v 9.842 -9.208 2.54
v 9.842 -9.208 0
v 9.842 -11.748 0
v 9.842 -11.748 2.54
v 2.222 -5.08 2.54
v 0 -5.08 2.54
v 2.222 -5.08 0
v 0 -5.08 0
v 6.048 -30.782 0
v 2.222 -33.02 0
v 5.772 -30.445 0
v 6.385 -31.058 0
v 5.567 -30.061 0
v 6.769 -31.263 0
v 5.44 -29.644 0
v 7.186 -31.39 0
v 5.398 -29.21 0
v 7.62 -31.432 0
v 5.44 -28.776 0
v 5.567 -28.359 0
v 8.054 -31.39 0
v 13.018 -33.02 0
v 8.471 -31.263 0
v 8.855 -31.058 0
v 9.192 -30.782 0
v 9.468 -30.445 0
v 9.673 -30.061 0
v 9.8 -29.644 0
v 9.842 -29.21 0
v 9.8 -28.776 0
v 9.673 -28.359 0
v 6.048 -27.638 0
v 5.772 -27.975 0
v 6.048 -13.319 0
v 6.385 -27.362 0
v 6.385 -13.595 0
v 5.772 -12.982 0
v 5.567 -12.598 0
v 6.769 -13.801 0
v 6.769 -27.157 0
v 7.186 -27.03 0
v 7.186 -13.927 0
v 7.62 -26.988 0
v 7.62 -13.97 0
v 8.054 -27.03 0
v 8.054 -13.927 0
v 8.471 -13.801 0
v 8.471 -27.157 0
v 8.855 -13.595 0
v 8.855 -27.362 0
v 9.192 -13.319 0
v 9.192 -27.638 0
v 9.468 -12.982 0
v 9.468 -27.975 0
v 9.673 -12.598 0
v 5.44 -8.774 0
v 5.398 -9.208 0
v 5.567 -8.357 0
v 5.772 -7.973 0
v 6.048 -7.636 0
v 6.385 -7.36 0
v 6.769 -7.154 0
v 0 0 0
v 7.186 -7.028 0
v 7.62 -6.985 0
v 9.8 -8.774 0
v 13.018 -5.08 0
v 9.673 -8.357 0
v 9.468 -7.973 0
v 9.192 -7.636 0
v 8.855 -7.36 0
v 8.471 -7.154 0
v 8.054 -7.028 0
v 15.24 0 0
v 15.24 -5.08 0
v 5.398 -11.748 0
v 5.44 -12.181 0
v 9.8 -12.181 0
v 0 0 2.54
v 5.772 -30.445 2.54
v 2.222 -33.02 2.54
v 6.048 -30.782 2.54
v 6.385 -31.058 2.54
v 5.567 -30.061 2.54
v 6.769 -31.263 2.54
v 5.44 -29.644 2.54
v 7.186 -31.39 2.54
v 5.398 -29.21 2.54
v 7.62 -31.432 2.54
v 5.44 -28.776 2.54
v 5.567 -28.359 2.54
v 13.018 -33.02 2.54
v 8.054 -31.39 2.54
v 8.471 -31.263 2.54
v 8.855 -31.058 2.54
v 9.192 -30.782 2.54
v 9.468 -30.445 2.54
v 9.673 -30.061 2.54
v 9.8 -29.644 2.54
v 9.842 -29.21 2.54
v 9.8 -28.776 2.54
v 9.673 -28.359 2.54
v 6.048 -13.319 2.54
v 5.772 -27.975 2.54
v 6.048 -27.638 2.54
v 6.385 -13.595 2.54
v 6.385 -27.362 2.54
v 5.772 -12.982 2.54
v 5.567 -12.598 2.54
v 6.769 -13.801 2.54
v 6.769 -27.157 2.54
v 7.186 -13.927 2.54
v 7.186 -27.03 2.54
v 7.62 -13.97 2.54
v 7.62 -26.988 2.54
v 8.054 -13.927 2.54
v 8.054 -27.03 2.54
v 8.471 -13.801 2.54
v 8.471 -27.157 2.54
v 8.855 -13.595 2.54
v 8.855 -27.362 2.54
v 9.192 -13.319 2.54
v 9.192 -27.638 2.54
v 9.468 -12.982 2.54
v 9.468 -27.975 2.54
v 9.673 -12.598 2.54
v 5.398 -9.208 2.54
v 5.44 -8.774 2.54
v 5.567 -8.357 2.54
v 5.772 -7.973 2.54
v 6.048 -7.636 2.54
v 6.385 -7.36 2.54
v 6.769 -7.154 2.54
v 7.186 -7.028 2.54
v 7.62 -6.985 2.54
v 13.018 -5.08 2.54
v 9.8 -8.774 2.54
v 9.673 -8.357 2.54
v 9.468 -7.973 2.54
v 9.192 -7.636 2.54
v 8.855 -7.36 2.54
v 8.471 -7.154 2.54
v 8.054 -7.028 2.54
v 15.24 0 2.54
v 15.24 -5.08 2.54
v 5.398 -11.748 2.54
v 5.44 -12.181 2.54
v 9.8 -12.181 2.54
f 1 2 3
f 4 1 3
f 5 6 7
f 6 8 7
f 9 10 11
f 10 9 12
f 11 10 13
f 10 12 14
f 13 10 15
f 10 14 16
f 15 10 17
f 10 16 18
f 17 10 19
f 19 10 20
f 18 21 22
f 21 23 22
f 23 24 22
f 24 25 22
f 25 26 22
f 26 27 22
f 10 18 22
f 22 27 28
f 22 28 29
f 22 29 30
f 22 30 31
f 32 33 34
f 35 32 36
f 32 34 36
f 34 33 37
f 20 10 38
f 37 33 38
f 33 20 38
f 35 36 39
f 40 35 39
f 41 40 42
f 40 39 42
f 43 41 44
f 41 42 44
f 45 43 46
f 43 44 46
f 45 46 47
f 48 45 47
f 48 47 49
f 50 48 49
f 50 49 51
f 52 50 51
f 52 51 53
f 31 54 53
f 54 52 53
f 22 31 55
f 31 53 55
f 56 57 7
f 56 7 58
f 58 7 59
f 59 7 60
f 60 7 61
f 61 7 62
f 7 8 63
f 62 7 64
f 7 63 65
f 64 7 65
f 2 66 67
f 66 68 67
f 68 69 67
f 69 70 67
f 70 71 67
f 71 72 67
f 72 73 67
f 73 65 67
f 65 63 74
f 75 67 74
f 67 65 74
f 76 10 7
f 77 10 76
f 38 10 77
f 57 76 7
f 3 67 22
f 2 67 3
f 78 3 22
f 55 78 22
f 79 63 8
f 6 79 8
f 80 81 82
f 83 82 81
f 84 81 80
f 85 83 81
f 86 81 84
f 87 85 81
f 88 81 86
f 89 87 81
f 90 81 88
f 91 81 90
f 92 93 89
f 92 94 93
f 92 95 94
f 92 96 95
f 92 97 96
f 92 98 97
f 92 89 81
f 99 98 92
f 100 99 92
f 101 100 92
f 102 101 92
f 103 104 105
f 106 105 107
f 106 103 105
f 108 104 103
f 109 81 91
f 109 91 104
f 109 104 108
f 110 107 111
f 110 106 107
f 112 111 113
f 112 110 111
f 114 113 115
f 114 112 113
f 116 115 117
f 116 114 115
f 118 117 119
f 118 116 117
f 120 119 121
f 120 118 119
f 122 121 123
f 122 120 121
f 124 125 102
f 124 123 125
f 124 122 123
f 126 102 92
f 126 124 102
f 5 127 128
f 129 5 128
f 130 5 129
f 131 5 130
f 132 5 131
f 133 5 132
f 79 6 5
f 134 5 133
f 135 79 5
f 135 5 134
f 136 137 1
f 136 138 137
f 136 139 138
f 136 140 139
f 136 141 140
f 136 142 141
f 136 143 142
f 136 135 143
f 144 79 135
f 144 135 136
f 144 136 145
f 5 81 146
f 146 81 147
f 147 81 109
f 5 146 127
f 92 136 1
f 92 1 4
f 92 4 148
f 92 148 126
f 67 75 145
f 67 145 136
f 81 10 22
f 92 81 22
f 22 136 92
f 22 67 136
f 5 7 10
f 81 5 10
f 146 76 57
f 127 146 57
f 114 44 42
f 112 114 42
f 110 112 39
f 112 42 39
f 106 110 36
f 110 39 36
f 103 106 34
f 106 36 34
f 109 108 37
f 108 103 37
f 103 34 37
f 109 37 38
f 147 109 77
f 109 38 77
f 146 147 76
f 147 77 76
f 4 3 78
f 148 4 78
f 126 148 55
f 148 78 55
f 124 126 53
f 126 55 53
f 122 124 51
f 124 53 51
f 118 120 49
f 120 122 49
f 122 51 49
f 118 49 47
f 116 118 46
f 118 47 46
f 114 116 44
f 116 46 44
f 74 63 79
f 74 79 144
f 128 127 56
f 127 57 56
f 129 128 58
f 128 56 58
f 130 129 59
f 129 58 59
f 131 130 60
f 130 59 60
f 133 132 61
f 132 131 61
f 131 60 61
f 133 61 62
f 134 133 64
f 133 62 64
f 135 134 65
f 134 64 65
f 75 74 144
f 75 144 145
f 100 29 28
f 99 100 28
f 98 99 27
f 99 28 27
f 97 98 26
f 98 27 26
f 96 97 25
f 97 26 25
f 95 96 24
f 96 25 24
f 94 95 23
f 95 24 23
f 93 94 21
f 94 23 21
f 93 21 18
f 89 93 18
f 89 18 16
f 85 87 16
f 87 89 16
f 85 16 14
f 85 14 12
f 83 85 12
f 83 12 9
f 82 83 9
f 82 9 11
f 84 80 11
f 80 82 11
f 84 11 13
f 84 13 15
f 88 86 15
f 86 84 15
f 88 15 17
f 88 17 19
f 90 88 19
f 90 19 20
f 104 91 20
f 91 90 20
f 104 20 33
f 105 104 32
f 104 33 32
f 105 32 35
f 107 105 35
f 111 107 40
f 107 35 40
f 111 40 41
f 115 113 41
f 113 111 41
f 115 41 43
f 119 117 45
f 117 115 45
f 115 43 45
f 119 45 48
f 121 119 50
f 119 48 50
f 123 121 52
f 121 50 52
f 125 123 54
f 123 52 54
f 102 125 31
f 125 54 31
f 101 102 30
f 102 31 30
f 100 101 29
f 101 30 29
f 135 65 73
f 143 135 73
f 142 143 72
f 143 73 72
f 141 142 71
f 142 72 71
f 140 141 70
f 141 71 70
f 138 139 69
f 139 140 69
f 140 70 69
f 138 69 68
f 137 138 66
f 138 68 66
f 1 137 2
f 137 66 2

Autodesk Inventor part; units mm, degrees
ref_plane "YZ Plane" through (0, 0, 0) normal (1, 0, 0) x (0, 1, 0)
ref_plane "XZ Plane" through (0, 0, 0) normal (0, 1, 0) x (-1, 0, 0)
ref_plane "XY Plane" through (0, 0, 0) normal (0, 0, 1) x (1, 0, 0)
sketch "Sketch1" plane through (0, 0, 0) normal (0, 0, 1) x (1, 0, 0)
  line L0 (0, 0) -> (15.24, 0)
  line L1 (15.24, 0) -> (15.24, -5.08)
  line L2 (15.24, -5.08) -> (13.0175, -5.08)
  line L3 (13.0175, -5.08) -> (13.0175, -33.02)
  line L4 (0, 0) -> (0, -5.08)
  line L5 (0, -5.08) -> (2.2225, -5.08)
  line L6 (2.2225, -5.08) -> (2.2225, -33.02)
  line L7 (2.2225, -33.02) -> (13.0175, -33.02)
  circle A0 centre (7.62, -29.21) radius 2.2225
  line L8 (7.62, -6.985) -> (7.62, -6.985)
  line L9 (9.8425, -9.2075) -> (9.8425, -11.7475)
  line L10 (7.62, -13.97) -> (7.62, -13.97)
  line L11 (5.3975, -11.7475) -> (5.3975, -9.2075)
  arc A1 (9.8425, -9.2075) -> (7.62, -6.985) centre (7.62, -9.2075) ccw
  arc A2 (7.62, -6.985) -> (5.3975, -9.2075) centre (7.62, -9.2075) ccw
  arc A3 (5.3975, -11.7475) -> (7.62, -13.97) centre (7.62, -11.7475) ccw
  arc A4 (7.62, -13.97) -> (9.8425, -11.7475) centre (7.62, -11.7475) ccw
  point P0 (9.8425, -13.97)
  point P1 (9.8425, -6.985)
  dimension "d0" = 15.24
  dimension "d1" = 5.08
  dimension "d2" = 2.2225
  dimension "d3" = 27.94
  dimension "d4" = 2.2225
  dimension "d5" = 4.445
  dimension "d6" = 3.81
  dimension "d7" = 6.985
  dimension "d8" = 6.985
  dimension "d9" = 2.2225
extrude "Extrusion1" add sketch "Sketch1" along normal blind 2.54
properties part number "MotorMount" material "Polycarbonate, Clear"
